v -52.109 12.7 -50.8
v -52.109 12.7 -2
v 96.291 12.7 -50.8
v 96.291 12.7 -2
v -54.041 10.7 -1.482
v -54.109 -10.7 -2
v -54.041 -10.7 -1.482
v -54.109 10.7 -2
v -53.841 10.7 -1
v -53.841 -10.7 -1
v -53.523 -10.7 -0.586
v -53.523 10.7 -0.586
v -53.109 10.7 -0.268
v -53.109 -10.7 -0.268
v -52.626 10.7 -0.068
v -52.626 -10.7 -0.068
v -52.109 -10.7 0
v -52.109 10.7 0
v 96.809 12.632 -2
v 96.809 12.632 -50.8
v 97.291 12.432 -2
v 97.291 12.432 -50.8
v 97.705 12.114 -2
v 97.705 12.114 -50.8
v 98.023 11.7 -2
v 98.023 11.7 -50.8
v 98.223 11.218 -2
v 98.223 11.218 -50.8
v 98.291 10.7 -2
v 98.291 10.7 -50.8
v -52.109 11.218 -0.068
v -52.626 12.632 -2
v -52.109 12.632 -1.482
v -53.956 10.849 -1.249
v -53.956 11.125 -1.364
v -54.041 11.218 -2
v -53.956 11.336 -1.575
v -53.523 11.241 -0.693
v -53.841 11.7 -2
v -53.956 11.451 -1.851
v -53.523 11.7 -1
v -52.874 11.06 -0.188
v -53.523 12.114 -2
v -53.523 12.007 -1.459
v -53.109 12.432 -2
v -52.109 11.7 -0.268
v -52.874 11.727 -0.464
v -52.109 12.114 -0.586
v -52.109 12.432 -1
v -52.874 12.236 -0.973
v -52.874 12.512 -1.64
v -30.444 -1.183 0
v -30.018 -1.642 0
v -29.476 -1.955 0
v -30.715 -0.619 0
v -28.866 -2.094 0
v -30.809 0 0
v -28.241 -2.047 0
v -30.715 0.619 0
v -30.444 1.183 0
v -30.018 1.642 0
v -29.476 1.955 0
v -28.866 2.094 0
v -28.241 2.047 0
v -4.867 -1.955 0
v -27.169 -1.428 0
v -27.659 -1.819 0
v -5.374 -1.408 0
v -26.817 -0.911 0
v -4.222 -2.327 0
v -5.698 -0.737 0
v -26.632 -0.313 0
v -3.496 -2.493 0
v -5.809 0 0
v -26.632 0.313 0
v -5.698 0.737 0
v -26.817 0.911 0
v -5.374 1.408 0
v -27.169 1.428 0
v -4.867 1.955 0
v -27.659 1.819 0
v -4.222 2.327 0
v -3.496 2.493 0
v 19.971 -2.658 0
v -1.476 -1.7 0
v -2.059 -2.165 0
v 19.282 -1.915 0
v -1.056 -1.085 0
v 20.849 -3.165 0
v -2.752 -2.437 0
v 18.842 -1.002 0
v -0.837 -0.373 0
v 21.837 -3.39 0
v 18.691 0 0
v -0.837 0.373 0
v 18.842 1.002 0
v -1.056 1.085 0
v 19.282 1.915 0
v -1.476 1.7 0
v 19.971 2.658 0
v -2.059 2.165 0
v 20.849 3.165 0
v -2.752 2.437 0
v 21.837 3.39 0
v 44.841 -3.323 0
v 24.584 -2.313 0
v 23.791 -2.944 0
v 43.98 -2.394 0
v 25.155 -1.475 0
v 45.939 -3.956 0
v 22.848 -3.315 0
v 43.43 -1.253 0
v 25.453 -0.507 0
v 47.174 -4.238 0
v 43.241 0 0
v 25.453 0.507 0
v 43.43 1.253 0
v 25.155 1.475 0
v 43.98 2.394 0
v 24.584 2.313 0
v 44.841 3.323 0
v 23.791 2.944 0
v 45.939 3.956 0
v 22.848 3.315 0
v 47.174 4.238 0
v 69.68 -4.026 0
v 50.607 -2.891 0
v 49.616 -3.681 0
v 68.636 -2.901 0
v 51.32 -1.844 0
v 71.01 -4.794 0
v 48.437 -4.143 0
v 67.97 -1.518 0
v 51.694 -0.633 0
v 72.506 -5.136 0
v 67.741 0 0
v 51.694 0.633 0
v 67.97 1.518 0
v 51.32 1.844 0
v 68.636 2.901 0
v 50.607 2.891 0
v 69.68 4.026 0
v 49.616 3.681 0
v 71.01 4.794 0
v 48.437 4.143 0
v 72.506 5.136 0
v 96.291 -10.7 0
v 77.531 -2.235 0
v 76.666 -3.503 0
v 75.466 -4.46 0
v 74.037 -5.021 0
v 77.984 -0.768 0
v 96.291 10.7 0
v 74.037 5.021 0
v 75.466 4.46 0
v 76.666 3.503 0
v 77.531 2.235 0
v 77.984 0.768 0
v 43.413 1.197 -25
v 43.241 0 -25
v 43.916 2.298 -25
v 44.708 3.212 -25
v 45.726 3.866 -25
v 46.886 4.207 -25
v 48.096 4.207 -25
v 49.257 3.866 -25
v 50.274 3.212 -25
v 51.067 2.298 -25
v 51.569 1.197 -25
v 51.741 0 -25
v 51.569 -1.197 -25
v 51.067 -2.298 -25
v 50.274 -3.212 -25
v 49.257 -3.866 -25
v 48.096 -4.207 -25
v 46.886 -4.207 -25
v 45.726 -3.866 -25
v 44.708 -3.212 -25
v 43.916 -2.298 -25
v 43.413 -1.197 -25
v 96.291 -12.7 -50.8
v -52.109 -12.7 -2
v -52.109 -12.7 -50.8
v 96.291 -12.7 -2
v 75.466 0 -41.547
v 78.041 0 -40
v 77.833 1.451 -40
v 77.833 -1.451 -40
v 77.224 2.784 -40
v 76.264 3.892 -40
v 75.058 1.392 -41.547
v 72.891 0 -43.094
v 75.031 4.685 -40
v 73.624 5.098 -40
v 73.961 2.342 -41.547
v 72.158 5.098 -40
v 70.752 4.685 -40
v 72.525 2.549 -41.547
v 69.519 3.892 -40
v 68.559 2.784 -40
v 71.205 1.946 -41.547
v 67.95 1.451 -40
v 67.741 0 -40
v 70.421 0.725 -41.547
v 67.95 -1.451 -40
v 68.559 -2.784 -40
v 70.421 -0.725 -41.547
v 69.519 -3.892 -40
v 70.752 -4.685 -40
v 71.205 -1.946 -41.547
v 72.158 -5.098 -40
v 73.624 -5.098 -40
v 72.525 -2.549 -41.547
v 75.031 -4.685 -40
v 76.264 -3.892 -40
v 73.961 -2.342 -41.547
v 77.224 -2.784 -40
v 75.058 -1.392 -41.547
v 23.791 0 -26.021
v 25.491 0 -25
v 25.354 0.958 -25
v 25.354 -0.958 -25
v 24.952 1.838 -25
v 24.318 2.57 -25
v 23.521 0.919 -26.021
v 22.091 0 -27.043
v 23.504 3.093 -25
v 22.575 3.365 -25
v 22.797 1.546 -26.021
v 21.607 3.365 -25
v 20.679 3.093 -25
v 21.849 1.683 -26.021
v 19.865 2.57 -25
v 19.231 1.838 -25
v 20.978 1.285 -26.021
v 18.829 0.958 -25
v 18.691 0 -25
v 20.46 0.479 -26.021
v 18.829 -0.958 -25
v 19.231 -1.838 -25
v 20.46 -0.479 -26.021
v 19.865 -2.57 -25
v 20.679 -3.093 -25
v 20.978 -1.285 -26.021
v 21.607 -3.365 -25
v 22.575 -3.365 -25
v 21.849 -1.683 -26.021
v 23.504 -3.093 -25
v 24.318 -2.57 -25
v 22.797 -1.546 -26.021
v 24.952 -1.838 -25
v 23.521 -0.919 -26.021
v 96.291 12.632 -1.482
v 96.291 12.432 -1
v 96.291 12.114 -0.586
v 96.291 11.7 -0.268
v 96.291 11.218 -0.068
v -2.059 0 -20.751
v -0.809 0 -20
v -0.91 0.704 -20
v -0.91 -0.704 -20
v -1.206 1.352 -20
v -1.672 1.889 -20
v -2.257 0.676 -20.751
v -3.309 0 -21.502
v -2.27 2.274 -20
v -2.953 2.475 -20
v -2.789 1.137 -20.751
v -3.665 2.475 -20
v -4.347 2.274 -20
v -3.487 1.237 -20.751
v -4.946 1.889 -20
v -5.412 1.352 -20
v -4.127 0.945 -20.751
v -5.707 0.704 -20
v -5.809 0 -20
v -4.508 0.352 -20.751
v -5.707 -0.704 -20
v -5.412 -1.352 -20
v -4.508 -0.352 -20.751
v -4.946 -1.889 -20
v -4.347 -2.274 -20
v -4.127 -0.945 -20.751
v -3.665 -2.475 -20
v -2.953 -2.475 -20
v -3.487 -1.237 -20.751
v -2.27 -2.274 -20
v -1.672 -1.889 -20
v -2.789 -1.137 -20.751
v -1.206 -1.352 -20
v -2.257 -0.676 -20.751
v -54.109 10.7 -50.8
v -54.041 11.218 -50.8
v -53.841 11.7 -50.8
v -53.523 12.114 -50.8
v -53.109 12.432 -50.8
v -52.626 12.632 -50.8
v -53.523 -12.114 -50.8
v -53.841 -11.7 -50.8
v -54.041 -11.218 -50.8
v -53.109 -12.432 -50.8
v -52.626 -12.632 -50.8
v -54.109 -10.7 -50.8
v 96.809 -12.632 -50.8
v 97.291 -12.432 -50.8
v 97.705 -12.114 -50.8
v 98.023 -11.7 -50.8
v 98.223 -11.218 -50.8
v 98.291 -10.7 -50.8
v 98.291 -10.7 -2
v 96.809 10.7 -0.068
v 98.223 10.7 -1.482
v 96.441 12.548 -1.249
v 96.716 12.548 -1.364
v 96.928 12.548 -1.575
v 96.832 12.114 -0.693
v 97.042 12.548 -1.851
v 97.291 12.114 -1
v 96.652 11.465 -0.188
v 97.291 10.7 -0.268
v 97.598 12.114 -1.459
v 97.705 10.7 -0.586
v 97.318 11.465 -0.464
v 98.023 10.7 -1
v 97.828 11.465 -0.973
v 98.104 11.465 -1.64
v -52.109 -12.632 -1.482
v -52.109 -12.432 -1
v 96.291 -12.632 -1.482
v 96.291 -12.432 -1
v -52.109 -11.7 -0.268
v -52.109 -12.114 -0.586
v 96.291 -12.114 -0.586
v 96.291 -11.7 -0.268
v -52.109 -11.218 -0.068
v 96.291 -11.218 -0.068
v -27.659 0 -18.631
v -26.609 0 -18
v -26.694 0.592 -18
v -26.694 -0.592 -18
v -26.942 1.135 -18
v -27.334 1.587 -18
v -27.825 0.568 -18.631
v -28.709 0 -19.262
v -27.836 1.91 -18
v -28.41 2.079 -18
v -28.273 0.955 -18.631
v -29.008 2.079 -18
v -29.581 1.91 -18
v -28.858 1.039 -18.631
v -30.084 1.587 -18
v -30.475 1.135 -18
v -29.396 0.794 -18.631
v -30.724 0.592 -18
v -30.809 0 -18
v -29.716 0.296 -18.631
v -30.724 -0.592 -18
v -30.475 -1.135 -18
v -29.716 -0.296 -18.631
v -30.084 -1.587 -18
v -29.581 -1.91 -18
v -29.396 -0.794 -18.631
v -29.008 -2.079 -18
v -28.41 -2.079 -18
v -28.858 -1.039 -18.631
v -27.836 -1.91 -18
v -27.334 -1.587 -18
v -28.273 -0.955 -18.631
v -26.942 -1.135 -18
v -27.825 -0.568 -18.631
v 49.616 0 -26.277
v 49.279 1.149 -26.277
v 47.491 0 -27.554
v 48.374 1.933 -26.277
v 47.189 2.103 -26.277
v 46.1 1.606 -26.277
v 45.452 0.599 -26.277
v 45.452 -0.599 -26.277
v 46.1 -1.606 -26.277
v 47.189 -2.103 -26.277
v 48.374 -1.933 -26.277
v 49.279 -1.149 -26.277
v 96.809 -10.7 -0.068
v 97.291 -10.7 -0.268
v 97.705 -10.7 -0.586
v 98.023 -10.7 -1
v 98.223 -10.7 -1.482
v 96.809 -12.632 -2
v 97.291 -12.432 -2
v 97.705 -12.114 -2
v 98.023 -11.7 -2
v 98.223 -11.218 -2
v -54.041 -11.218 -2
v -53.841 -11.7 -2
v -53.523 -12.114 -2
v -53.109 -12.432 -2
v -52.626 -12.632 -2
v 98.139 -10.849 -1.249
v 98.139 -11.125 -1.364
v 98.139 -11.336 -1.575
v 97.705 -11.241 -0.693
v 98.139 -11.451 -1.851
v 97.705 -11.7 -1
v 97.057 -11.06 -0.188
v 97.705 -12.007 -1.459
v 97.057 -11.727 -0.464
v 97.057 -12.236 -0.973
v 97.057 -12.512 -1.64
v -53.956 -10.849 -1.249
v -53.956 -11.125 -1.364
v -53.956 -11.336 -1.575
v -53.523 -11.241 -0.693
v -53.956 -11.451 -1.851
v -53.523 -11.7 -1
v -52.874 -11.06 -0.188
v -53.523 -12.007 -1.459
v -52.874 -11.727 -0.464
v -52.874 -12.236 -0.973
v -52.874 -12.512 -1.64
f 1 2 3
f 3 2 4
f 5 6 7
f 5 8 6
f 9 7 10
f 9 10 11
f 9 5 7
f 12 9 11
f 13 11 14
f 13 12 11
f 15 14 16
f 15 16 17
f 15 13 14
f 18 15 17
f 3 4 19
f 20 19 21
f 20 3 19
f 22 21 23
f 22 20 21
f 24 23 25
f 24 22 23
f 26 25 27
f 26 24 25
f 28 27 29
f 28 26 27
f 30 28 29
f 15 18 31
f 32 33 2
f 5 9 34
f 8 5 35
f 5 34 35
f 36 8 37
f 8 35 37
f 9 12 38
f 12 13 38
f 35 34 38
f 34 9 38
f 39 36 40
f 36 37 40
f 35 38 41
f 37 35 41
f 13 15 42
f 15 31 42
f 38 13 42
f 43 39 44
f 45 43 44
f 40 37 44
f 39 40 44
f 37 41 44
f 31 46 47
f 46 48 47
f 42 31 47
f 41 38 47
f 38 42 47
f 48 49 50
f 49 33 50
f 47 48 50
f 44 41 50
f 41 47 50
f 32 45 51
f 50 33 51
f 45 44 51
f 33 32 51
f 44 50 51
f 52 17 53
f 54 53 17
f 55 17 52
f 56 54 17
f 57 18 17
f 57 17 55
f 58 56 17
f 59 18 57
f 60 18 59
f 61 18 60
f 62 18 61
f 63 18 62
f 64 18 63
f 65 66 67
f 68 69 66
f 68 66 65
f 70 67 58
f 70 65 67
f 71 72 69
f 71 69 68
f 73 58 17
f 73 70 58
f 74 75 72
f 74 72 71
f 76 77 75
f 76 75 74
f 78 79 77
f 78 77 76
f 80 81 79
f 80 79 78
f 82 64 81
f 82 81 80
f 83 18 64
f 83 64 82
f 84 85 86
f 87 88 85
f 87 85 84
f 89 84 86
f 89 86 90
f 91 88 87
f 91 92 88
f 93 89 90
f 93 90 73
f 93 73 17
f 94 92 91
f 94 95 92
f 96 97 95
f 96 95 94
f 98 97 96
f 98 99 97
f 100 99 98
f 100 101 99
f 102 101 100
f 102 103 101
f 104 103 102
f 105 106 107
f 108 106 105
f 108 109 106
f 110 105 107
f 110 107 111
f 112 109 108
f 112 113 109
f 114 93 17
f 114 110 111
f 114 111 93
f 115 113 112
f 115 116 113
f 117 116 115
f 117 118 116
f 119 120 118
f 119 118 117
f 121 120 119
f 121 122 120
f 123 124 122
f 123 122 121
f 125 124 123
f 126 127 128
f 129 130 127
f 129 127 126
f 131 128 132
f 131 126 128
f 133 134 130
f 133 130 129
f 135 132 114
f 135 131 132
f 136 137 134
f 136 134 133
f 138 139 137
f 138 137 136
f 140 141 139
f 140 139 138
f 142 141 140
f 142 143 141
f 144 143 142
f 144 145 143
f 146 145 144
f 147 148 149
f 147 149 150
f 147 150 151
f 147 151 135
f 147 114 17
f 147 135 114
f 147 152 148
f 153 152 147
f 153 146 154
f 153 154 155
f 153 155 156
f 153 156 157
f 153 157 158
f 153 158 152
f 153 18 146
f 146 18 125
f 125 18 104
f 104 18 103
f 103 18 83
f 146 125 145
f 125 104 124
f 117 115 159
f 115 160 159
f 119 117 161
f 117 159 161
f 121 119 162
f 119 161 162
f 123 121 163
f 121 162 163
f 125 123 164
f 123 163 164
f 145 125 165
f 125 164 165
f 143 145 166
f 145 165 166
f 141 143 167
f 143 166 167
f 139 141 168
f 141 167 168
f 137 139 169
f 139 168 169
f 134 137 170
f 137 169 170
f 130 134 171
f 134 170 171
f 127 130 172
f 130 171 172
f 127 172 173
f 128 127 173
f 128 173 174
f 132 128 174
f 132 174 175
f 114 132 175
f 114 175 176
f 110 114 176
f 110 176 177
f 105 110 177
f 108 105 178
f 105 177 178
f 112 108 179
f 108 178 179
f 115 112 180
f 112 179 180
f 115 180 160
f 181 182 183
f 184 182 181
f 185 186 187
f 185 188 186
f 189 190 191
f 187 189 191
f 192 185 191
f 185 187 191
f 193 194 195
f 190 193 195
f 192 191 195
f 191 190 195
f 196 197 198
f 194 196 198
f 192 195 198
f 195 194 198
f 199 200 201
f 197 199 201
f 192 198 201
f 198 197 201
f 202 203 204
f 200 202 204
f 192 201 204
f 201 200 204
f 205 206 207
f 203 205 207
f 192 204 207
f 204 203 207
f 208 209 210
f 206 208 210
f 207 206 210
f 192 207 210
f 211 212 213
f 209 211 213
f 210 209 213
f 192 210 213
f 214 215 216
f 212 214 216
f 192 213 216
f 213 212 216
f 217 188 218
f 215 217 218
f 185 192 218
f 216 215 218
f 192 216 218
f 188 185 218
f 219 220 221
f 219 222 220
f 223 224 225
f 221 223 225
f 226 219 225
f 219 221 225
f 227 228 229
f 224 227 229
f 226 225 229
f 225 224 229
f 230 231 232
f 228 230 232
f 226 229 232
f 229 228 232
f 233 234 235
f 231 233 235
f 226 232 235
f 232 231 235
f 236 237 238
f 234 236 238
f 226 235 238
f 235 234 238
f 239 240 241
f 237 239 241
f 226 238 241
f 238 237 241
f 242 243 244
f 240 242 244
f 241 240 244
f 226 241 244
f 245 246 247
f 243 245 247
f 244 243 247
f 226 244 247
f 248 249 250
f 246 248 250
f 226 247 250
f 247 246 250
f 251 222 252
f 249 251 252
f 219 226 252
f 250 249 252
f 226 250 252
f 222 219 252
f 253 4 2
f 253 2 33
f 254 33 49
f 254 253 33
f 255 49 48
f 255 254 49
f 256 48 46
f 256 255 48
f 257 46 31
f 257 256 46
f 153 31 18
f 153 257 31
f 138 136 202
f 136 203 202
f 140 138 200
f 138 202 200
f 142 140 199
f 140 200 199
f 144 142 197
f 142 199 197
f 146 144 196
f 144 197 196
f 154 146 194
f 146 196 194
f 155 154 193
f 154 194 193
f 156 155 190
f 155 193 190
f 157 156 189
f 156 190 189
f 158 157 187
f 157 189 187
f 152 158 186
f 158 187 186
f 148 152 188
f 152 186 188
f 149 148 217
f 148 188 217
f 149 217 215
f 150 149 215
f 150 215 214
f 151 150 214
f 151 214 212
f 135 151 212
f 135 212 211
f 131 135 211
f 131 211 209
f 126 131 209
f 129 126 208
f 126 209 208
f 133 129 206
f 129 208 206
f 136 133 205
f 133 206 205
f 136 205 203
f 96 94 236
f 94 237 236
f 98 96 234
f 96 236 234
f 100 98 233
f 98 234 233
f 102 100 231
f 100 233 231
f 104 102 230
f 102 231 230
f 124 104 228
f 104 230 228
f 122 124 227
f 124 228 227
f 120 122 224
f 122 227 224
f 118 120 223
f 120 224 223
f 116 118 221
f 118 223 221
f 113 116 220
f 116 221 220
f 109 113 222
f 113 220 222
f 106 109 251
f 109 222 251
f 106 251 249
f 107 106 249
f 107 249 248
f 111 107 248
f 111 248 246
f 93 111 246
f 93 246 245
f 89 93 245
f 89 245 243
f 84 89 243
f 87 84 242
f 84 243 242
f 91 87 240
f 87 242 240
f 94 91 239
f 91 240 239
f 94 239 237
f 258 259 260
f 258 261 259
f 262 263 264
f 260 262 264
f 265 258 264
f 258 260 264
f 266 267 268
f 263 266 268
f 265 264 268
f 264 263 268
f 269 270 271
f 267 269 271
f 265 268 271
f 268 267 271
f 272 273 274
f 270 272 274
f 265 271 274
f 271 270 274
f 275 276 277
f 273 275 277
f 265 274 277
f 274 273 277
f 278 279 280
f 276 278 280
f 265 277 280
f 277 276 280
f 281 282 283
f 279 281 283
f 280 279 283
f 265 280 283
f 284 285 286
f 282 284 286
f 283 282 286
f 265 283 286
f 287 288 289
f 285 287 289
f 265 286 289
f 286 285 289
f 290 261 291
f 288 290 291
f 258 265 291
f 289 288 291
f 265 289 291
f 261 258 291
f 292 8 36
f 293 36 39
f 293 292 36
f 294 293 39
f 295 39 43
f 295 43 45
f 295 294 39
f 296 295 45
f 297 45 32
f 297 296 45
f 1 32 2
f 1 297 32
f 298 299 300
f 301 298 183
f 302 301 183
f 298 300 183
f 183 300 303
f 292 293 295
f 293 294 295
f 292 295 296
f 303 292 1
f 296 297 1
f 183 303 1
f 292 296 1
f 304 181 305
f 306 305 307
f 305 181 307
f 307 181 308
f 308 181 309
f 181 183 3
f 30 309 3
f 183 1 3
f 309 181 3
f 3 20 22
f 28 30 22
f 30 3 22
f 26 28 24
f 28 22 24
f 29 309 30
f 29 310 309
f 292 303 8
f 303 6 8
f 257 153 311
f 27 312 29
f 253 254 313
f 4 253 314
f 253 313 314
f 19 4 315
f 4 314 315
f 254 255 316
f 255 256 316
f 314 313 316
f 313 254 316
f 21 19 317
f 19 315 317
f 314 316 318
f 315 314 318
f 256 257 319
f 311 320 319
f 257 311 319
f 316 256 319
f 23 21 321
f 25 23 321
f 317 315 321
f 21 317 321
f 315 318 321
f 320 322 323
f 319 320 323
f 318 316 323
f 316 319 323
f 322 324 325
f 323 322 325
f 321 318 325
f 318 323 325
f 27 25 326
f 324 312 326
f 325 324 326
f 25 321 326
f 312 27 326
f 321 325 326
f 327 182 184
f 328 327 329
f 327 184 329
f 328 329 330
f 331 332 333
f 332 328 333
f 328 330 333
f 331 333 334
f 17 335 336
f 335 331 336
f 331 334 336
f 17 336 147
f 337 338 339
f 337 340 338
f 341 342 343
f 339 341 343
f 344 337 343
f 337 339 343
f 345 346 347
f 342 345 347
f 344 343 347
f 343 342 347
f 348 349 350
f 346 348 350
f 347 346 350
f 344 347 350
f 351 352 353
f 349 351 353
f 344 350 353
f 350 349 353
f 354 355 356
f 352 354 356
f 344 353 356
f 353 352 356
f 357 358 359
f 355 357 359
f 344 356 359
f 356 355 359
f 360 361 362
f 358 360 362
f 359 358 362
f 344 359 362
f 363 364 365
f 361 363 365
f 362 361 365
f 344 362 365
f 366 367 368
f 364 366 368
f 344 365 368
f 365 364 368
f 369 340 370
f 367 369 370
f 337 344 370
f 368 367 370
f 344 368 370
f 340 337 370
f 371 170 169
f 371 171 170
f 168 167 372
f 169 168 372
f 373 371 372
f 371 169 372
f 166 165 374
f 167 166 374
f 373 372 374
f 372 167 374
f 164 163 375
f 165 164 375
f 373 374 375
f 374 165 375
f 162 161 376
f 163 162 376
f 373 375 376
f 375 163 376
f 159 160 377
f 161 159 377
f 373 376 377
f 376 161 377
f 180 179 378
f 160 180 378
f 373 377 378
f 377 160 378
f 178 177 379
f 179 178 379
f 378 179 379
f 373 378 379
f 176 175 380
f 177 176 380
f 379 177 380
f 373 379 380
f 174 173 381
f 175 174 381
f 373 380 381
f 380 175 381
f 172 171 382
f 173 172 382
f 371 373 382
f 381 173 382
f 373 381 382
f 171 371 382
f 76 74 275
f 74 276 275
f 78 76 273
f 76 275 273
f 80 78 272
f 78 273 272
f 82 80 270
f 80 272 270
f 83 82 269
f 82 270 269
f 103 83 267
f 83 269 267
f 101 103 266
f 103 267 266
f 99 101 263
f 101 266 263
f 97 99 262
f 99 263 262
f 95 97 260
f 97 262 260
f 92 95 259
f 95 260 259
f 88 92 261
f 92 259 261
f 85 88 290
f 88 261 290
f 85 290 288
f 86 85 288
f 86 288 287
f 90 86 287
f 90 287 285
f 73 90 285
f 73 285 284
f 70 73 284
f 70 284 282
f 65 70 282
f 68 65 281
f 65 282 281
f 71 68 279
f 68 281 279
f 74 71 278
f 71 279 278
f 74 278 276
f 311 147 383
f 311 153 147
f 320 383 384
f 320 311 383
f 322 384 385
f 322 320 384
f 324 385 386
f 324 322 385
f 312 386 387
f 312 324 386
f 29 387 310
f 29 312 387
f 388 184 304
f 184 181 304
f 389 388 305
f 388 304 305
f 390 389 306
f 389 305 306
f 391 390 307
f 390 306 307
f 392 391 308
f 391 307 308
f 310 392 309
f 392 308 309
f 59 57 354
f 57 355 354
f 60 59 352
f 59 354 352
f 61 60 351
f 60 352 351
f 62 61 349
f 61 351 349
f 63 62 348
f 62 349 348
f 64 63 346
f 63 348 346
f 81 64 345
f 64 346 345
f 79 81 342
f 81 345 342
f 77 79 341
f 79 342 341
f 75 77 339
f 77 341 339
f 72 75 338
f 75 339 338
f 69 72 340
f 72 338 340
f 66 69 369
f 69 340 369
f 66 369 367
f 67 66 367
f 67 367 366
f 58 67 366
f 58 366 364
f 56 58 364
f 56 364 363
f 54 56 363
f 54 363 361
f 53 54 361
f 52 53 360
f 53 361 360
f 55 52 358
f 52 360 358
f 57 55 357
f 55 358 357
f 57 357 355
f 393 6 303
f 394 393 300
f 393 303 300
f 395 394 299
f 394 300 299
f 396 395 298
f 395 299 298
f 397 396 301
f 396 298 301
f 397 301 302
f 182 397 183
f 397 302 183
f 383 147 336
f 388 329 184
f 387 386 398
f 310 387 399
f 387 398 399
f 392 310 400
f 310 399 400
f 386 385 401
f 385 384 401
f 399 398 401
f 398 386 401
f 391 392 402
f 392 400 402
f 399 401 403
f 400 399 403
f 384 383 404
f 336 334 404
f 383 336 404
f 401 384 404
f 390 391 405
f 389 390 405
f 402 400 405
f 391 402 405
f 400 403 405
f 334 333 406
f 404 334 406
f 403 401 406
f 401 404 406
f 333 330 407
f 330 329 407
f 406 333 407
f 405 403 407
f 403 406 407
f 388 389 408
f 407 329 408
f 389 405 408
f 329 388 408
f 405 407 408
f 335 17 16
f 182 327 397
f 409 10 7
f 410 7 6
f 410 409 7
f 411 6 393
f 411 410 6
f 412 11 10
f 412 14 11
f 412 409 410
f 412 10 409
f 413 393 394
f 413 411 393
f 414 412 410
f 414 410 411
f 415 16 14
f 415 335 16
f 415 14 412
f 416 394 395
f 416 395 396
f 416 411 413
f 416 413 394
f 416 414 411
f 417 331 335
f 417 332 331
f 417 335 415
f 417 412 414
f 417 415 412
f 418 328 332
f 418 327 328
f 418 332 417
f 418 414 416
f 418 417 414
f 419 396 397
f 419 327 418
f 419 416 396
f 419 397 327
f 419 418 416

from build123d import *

# Parameters (mm, degrees)
F0_W     = 152.4
F0_H     = 25.4
F1_DEPTH = 50.8
F2_D     = 4.2
F2_DEPTH = 18
F2_TIP   = 1.2618073
F3_D     = 5
F3_DEPTH = 20
F3_TIP   = 1.5021515476
F4_D     = 6.8
F4_DEPTH = 25
F4_TIP   = 2.0429261047
F5_D     = 8.5
F5_DEPTH = 25
F5_TIP   = 2.5536576309
F6_D     = 10.3
F6_DEPTH = 40
F6_TIP   = 3.094432188
F7_R     = 2


with BuildPart() as f1:
    # F0 (on Top) → F1 (new body)
    with BuildSketch(Plane.XY):
        with Locations((22.0912756948, 0)):
            Rectangle(F0_W, F0_H)
    extrude(amount=-F1_DEPTH)

    # F2
    with Locations(Plane.XY):
        with Locations((-28.7087243052, 0)):
            Hole(F2_D / 2, depth=F2_DEPTH)
            with Locations((0, 0, -(F2_DEPTH + F2_TIP / 2))):  # 118° drill point
                Cone(0, F2_D / 2, F2_TIP, mode=Mode.SUBTRACT)

    # F3
    with Locations(Plane.XY):
        with Locations((-3.3087243052, 0)):
            Hole(F3_D / 2, depth=F3_DEPTH)
            with Locations((0, 0, -(F3_DEPTH + F3_TIP / 2))):  # 118° drill point
                Cone(0, F3_D / 2, F3_TIP, mode=Mode.SUBTRACT)

    # F4
    with Locations(Plane.XY):
        with Locations((22.0912756948, 0)):
            Hole(F4_D / 2, depth=F4_DEPTH)
            with Locations((0, 0, -(F4_DEPTH + F4_TIP / 2))):  # 118° drill point
                Cone(0, F4_D / 2, F4_TIP, mode=Mode.SUBTRACT)

    # F5
    with Locations(Plane.XY):
        with Locations((47.4912756948, 0)):
            Hole(F5_D / 2, depth=F5_DEPTH)
            with Locations((0, 0, -(F5_DEPTH + F5_TIP / 2))):  # 118° drill point
                Cone(0, F5_D / 2, F5_TIP, mode=Mode.SUBTRACT)

    # F6
    with Locations(Plane.XY):
        with Locations((72.8912756948, 0)):
            Hole(F6_D / 2, depth=F6_DEPTH)
            with Locations((0, 0, -(F6_DEPTH + F6_TIP / 2))):  # 118° drill point
                Cone(0, F6_D / 2, F6_TIP, mode=Mode.SUBTRACT)

    # F7
    f7_edges = [f1.edges().sort_by_distance(p)[0] for p in [
        (22.091276, -12.7, 0),
        (98.291276, 0, 0),
        (22.091276, 12.7, 0),
        (-54.108724, 0, 0),
        (98.291276, 12.7, -25.4),
        (98.291276, -12.7, -25.4),
        (-54.108724, 12.7, -25.4),
        (-54.108724, -12.7, -25.4),
    ]]
    fillet(f7_edges, radius=F7_R)


solid = f1.part
